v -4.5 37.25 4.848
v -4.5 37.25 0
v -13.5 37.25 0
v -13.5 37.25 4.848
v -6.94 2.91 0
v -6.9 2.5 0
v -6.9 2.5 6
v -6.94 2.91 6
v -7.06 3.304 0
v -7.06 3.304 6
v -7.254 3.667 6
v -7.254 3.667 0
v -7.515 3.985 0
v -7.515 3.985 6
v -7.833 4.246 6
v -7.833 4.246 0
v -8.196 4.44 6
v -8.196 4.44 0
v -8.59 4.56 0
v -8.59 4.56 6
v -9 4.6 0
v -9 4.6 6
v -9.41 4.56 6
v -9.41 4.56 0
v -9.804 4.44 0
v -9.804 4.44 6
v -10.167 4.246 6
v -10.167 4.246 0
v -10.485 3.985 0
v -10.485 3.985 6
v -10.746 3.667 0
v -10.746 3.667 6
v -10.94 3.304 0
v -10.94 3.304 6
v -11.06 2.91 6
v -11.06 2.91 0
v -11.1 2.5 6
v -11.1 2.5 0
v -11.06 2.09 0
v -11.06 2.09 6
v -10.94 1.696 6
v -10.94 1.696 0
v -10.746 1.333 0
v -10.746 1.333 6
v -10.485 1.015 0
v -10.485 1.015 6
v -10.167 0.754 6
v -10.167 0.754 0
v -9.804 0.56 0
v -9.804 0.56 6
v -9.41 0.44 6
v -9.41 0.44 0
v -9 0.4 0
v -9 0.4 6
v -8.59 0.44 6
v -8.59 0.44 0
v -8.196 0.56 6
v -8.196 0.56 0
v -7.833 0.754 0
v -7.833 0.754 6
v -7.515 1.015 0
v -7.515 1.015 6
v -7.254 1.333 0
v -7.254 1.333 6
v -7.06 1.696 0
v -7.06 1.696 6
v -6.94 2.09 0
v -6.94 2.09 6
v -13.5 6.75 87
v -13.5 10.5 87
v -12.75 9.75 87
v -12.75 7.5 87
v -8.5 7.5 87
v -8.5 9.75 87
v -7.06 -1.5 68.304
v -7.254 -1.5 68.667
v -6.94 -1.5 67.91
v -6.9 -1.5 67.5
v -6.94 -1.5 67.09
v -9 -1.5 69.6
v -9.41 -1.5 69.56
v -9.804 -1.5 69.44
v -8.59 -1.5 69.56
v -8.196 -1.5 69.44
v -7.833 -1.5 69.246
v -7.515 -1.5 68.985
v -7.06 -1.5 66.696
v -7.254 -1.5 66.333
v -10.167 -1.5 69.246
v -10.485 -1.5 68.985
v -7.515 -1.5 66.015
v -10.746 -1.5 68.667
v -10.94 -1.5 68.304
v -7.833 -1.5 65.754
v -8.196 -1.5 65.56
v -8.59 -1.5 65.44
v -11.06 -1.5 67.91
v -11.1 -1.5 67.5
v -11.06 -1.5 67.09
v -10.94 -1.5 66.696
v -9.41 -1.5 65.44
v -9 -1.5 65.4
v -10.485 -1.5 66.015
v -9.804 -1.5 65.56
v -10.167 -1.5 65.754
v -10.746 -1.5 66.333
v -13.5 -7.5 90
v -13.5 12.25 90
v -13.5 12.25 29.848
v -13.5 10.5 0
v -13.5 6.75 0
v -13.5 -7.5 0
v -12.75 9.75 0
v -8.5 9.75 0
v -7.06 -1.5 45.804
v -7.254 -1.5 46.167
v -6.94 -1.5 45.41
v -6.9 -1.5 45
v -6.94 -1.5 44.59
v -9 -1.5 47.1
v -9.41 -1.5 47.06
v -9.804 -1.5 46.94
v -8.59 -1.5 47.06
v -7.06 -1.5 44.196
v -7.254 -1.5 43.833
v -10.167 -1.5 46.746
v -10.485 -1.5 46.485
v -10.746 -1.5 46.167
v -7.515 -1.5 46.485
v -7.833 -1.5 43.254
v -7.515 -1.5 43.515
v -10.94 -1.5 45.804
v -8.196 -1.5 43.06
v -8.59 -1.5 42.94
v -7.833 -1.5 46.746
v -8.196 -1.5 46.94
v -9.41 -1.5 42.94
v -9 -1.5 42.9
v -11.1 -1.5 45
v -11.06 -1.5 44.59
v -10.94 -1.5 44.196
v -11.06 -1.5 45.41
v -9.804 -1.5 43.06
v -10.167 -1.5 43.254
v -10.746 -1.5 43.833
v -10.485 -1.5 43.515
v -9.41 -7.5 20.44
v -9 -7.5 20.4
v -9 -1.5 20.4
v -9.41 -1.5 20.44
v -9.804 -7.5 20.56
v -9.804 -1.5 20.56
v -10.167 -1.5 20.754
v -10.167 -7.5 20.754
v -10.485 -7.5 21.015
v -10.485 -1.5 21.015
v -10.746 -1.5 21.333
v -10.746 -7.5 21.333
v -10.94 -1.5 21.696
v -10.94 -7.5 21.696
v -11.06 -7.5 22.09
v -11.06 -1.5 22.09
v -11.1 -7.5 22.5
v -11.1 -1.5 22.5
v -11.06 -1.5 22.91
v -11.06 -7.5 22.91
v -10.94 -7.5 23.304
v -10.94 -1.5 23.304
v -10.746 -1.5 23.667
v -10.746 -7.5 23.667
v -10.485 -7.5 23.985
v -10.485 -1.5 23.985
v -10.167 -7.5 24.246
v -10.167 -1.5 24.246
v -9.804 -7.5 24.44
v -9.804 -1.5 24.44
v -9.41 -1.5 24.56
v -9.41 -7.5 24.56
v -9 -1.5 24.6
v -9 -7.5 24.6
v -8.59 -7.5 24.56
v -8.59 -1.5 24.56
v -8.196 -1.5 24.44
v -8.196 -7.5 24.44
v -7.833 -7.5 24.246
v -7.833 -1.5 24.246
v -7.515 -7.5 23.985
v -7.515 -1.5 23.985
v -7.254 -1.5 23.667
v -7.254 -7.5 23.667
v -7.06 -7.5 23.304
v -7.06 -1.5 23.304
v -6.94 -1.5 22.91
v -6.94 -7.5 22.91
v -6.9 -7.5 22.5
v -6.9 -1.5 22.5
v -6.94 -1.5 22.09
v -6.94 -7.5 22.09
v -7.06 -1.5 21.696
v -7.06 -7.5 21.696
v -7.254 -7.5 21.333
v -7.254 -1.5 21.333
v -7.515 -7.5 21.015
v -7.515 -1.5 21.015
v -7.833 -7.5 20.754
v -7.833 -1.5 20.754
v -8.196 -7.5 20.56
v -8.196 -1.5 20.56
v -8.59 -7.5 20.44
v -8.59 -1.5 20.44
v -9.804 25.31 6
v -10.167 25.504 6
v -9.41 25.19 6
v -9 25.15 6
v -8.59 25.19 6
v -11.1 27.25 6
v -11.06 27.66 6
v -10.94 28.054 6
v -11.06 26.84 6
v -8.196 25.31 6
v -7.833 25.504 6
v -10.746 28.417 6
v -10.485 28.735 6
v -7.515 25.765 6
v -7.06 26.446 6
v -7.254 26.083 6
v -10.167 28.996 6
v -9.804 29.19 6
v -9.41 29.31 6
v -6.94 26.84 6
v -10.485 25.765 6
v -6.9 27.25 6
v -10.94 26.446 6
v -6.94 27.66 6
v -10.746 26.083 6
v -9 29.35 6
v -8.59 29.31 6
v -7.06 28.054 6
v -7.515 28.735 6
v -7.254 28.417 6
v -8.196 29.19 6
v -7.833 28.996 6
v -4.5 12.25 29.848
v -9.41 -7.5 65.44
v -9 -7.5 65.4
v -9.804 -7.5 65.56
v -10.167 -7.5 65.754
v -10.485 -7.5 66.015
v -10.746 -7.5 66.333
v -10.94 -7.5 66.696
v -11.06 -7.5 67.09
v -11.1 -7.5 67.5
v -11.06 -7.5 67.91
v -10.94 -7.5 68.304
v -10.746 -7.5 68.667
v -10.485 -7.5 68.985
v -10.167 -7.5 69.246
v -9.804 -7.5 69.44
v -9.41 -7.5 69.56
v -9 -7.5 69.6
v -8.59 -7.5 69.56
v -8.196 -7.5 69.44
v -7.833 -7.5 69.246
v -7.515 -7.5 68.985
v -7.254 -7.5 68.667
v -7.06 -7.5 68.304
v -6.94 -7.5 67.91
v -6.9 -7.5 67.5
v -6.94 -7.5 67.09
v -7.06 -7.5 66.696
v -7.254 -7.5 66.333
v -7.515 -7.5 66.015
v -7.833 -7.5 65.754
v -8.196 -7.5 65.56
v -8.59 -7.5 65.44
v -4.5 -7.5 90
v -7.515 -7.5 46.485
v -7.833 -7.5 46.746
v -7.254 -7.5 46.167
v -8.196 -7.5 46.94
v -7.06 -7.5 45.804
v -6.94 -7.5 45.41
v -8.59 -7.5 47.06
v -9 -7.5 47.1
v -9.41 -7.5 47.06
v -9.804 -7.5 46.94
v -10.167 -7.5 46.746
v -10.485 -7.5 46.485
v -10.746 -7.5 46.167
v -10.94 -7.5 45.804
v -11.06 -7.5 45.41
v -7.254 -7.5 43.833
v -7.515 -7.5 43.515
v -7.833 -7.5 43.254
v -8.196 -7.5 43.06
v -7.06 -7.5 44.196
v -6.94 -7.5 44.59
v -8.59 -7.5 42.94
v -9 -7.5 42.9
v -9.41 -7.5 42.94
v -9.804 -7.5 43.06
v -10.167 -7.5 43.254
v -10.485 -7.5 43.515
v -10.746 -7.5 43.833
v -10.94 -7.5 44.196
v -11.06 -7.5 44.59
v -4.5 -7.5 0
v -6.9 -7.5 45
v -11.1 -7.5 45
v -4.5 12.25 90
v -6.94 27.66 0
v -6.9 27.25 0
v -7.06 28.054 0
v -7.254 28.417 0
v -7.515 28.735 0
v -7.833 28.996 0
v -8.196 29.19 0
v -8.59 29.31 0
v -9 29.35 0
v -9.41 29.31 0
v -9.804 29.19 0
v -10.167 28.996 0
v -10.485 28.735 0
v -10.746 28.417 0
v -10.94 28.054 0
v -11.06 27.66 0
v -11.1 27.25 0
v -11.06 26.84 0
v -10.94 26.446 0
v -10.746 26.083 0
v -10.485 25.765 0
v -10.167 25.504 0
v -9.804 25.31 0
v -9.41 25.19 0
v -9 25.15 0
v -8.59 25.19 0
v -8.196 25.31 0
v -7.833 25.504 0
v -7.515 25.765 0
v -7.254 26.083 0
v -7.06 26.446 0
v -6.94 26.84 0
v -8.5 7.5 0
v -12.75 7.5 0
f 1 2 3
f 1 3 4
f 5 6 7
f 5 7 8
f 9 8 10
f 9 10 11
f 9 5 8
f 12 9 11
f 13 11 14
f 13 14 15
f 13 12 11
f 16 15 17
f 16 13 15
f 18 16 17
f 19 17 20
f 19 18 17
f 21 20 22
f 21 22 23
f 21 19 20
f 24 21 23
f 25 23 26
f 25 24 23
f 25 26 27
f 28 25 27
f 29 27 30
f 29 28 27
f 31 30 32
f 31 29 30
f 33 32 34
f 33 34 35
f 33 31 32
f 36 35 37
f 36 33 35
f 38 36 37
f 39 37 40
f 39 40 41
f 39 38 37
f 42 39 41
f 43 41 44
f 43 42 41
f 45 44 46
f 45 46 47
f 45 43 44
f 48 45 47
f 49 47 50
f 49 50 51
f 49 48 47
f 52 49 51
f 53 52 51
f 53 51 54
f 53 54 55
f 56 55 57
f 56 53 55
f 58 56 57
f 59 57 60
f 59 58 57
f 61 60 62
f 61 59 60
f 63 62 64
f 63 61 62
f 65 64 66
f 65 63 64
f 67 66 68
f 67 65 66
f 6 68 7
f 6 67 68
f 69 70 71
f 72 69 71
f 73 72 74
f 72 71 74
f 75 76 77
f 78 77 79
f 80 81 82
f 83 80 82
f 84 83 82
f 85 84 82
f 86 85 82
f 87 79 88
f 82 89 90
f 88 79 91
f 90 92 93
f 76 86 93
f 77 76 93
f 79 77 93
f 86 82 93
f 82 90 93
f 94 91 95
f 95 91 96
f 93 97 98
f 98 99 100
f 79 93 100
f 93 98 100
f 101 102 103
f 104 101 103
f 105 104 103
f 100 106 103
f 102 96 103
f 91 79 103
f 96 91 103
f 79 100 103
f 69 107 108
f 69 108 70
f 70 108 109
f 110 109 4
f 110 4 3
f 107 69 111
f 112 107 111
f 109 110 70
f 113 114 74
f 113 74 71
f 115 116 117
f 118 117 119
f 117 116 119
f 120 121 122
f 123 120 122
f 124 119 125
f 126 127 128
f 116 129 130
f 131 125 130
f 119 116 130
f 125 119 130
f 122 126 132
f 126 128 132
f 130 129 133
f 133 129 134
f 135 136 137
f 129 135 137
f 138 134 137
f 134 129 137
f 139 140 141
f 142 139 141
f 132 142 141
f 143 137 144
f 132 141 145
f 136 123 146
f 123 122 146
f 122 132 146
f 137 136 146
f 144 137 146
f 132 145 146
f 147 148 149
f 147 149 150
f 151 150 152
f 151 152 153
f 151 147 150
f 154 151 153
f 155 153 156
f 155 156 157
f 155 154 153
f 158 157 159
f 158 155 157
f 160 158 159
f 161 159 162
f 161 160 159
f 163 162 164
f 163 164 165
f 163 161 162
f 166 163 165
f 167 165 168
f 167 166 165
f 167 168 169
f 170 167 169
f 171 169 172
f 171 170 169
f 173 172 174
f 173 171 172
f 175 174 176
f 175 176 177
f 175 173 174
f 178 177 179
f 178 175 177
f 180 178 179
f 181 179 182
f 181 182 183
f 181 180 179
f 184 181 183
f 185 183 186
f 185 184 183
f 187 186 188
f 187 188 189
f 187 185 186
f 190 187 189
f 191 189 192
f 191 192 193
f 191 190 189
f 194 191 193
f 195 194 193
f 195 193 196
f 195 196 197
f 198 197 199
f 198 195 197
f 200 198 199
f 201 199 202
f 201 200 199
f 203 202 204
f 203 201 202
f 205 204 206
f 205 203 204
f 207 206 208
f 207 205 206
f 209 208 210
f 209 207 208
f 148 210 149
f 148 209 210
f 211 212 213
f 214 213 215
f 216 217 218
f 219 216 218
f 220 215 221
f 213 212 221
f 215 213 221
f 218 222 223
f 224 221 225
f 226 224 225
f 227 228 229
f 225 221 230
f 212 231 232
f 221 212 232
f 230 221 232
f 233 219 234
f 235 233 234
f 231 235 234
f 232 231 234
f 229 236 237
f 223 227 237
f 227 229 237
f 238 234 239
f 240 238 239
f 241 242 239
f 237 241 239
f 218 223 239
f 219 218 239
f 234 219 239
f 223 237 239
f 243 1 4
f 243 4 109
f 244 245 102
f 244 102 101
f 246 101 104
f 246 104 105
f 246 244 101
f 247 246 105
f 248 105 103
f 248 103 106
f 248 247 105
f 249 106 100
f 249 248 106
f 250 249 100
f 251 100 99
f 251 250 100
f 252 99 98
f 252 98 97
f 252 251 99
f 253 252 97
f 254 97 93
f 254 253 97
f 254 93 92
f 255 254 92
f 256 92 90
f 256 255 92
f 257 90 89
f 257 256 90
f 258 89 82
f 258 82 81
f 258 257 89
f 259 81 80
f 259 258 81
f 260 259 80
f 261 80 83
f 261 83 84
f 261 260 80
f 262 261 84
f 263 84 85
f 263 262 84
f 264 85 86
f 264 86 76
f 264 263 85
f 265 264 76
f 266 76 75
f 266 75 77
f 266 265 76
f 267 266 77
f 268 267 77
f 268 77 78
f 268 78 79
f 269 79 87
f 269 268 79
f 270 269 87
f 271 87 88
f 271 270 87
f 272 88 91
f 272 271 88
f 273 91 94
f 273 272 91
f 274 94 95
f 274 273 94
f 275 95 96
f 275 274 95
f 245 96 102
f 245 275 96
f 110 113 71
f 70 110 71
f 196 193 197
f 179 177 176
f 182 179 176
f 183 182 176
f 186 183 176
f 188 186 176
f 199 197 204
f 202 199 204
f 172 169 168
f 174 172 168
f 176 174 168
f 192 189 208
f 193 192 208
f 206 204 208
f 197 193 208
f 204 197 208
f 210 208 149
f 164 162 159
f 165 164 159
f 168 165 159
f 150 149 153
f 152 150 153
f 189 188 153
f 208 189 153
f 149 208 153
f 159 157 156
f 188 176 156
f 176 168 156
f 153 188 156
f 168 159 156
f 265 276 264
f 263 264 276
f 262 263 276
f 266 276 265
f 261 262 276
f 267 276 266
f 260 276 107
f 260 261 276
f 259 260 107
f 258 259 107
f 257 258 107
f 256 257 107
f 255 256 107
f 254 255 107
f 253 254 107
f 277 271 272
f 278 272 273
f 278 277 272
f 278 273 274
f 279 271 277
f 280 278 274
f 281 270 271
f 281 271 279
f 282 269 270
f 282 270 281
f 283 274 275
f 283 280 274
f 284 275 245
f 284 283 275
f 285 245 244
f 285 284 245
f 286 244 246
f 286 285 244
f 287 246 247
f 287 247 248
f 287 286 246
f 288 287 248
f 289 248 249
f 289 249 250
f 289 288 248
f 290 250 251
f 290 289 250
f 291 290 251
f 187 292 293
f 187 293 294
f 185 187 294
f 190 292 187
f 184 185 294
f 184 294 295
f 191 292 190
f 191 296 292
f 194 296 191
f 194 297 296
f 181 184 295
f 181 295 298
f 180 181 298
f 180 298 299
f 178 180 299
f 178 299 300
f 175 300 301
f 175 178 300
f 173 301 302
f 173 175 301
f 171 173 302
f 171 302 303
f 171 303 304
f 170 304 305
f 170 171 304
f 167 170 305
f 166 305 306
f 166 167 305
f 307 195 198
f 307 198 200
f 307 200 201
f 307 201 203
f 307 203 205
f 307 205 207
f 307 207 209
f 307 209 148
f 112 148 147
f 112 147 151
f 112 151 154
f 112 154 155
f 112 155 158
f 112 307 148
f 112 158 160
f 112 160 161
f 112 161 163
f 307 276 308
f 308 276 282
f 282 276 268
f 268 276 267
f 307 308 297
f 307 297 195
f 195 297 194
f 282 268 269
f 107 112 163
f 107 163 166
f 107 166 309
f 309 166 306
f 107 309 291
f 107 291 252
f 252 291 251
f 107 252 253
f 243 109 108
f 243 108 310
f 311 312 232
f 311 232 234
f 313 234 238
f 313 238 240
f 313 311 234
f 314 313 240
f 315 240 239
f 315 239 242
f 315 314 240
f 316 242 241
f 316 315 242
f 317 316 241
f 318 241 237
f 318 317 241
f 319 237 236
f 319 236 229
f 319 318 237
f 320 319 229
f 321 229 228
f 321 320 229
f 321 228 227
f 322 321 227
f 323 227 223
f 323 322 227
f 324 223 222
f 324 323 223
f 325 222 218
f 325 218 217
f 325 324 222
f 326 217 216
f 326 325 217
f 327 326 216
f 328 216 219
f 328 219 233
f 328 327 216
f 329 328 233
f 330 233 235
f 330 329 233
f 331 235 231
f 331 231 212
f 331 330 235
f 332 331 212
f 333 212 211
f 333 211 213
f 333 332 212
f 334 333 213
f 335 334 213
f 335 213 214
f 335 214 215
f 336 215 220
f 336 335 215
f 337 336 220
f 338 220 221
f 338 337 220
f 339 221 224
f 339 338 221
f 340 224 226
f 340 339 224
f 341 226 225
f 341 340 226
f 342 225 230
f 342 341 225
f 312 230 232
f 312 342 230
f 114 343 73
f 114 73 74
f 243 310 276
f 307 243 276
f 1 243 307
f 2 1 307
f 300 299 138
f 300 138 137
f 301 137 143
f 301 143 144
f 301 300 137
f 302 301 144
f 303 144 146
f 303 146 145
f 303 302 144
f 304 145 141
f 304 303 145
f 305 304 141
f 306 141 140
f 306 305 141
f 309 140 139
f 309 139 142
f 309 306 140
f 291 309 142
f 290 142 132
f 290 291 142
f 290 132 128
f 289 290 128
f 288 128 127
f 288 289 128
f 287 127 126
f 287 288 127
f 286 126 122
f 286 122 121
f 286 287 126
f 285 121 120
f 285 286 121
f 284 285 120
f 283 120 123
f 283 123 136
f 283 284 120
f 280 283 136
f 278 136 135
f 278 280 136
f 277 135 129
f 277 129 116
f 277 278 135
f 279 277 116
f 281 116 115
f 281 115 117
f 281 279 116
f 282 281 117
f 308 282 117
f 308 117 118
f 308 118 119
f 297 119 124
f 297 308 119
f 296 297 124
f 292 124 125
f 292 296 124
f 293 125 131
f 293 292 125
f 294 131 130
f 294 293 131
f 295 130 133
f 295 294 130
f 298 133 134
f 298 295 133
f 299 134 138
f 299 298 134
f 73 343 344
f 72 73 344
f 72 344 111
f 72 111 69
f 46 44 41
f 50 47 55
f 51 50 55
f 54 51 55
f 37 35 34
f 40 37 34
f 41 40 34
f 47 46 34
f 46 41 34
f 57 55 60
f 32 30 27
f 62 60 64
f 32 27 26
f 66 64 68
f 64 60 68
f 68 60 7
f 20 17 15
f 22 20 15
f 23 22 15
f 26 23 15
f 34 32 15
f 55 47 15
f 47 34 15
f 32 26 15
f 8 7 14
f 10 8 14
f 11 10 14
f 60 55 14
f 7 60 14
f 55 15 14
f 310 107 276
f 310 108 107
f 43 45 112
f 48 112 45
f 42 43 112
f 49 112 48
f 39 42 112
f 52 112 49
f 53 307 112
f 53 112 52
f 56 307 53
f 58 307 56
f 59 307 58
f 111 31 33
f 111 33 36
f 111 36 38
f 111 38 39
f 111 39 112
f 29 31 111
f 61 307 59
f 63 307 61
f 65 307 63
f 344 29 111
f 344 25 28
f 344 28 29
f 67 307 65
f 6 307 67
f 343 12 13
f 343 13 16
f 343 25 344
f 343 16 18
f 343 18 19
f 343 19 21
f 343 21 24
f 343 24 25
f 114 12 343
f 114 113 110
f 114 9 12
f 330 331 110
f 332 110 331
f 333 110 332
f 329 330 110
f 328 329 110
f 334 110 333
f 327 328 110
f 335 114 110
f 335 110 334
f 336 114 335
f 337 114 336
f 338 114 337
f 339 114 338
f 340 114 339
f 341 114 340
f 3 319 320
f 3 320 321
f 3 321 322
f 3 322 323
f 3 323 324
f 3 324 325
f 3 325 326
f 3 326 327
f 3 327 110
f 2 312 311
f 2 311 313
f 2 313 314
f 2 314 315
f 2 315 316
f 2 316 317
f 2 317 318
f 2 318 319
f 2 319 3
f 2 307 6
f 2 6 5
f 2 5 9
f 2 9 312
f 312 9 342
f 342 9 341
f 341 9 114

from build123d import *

# Parameters (mm, degrees)
SKETCH_1_W          = 9
SKETCH_1_H          = 15
EXTRUDE_1_DEPTH     = 90
SKETCH_2_R          = 2.1
CUT_EXTRUDE_1_DEPTH = 6
SKETCH_3_W          = 5
SKETCH_3_H          = 2.25
EXTRUDE_2_DEPTH     = 3
CHAMFER_1_SIZE      = 0.75
EXTRUDE_3_DEPTH     = 9
SKETCH_4_R          = 2.1
CUT_EXTRUDE_2_DEPTH = 6


with BuildPart() as part:
    # Эскиз1 → Бобышка-Вытянуть1 (new body)
    with BuildSketch(Plane.XY):
        Rectangle(SKETCH_1_W, SKETCH_1_H)
        Polygon((-4.5, 12.25), (-4.5, 7.5), (-0.5, 7.5), (-0.5, 9.75), (4.5, 9.75), (4.5, 12.25), align=None)
    extrude(amount=EXTRUDE_1_DEPTH)

    # Эскиз2 → Вырез-Вытянуть1 (cut)
    with BuildSketch(Plane.XZ.offset(7.5)):
        with Locations(Location((0, 22.5, 0), (0, 0, 270))):
            Circle(SKETCH_2_R)
        with Locations(Location((0, 67.5, 0), (0, 0, 270))):
            Circle(SKETCH_2_R)
        with Locations(Location((0, 45, 0), (0, 0, 270))):
            Circle(SKETCH_2_R)
    extrude(amount=-CUT_EXTRUDE_1_DEPTH, mode=Mode.SUBTRACT)

    # Эскиз3 → Бобышка-Вытянуть2 (add)
    with BuildSketch(Plane(origin=(0, 0, 90), x_dir=(-1, 0, 0), z_dir=(0, 0, -1))):
        with Locations((-2, 8.625)):
            Rectangle(SKETCH_3_W, SKETCH_3_H)
    extrude(amount=EXTRUDE_2_DEPTH)

    # Фаска1
    chamfer_1_edges = [part.edges().sort_by_distance(p)[0] for p in [
        (4.5, 9.75, 43.5),
        (4.5, 7.5, 43.5),
    ]]
    chamfer(chamfer_1_edges, length=CHAMFER_1_SIZE)

    # Эскиз5 → Бобышка-Вытянуть3 (add)
    with BuildSketch(Plane.ZY.offset(4.5)):
        Polygon((0, 12.25), (0, 37.25), (4.84785343, 37.25), (29.84785343, 12.25), align=None)
    extrude(amount=-EXTRUDE_3_DEPTH)

    # Эскиз4 → Вырез-Вытянуть2 (cut)
    with BuildSketch(Plane(origin=(0, 0, 0), x_dir=(-1, 0, 0), z_dir=(0, 0, -1))):
        with Locations((0, 2.5)):
            Circle(SKETCH_4_R)
        with Locations((0, 27.25)):
            Circle(SKETCH_4_R)
    extrude(amount=-CUT_EXTRUDE_2_DEPTH, mode=Mode.SUBTRACT)


with BuildPart() as body_2:
    # Зеркальное отражение1: mirrored copy
    add(part.part.mirror(Plane(origin=(-4.5, 0, 90), x_dir=(0, 0, 1), z_dir=(-1, 0, 0))))


solid = body_2.part
